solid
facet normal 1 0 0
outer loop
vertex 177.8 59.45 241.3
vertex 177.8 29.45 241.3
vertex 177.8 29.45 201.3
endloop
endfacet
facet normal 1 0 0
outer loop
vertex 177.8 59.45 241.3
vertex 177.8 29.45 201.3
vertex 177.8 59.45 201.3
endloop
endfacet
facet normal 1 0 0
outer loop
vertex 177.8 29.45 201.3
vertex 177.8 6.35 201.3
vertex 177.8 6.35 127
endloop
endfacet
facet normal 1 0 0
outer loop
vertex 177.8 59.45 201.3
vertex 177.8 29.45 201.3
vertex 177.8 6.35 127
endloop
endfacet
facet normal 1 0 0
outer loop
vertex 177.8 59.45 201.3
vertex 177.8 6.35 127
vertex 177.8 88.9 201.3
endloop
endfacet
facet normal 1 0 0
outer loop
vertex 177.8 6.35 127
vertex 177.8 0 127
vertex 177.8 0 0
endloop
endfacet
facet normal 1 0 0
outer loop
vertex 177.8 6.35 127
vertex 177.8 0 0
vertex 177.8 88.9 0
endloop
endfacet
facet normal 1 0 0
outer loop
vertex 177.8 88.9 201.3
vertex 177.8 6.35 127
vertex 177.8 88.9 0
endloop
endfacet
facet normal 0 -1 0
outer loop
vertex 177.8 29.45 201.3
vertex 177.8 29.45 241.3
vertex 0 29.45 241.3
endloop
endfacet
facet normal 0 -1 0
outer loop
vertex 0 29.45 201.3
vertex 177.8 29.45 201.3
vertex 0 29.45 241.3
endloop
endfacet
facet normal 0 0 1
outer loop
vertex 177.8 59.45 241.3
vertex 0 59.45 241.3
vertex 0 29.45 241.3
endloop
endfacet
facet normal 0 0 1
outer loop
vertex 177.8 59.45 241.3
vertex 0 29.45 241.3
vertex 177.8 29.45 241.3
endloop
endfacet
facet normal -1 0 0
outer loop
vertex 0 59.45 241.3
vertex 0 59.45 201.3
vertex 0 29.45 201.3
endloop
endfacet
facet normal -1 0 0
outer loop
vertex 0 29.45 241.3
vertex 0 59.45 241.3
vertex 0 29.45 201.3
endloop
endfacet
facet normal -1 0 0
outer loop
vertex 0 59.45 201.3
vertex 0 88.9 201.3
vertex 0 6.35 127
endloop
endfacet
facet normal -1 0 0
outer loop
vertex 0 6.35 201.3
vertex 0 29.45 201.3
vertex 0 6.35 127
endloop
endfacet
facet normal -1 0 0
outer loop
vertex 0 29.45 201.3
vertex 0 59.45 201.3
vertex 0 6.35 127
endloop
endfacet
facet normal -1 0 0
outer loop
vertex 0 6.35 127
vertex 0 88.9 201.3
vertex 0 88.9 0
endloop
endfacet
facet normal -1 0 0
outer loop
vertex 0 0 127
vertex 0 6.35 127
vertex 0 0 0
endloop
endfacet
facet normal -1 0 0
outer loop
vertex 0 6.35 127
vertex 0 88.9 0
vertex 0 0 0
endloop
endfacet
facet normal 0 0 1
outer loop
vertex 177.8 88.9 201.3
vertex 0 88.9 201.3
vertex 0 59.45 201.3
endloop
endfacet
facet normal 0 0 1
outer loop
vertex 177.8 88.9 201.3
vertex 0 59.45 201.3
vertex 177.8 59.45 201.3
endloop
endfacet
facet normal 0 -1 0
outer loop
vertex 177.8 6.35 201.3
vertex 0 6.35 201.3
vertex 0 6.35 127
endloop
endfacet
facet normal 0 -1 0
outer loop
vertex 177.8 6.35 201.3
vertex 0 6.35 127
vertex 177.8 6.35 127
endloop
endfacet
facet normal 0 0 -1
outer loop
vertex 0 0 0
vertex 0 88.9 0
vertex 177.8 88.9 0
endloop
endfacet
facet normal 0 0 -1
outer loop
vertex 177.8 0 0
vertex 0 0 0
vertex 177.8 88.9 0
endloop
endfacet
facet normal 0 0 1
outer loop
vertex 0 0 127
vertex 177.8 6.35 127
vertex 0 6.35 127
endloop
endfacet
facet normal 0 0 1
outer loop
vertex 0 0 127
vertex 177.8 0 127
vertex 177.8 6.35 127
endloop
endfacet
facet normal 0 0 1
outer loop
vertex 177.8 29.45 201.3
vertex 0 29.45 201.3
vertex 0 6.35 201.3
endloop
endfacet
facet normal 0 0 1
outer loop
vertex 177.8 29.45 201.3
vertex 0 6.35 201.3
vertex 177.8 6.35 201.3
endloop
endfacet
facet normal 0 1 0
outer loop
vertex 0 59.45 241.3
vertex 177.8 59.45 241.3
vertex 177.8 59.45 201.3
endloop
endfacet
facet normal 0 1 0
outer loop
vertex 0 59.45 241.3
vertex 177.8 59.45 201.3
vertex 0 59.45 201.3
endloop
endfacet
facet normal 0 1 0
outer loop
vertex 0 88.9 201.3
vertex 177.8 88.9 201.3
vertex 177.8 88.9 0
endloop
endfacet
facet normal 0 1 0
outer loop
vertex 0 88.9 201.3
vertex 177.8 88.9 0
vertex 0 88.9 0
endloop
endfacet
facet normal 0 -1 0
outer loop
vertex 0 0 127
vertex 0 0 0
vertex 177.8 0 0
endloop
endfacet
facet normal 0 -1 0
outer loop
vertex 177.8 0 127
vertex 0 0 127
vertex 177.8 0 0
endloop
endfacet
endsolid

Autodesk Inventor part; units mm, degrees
ref_plane "YZ Plane" through (0, 0, 0) normal (1, 0, 0) x (0, 1, 0)
ref_plane "XZ Plane" through (0, 0, 0) normal (0, 1, 0) x (-1, 0, 0)
ref_plane "XY Plane" through (0, 0, 0) normal (0, 0, 1) x (1, 0, 0)
sketch "Sketch1" plane through (0, 0, 0) normal (0, 0, 1) x (1, 0, 0)
  line L0 (0, 0) -> (177.8, 0)
  line L1 (177.8, 0) -> (177.8, 88.9)
  line L2 (177.8, 88.9) -> (0, 88.9)
  line L3 (0, 88.9) -> (0, 0)
  dimension "d0" = 88.9
  dimension "d1" = 177.8
extrude "Extrusion1" add sketch "Sketch1" along normal blind 241.3
sketch "Sketch2" plane through (0, 0, 0) normal (0, -1, 0) x (1, 0, 0)
  line L0 (0, 0) -> (0, 241.3) projected
  line L1 (177.8, 0) -> (177.8, 241.3) projected
  line L2 (0, 203.2) -> (177.8, 203.2)
  line L3 (177.8, 203.2) -> (177.8, 127)
  line L4 (177.8, 127) -> (0, 127)
  line L5 (0, 127) -> (0, 203.2)
  line L6 (0, 0) -> (177.8, 0) projected
  dimension "d4" = 203.2
  dimension "d5" = 127
extrude "Extrusion2" cut sketch "Sketch2" against normal blind 6.35 contours L0 L2 L1 L4
sketch "Sketch3" plane through (0, 0, 241.3) normal (0, 0, 1) x (1, 0, 0)
  line L0 (177.8, 0) -> (177.8, 88.9) projected
  line L1 (0, 0) -> (177.8, 0)
  line L2 (177.8, 0) -> (177.8, 29.45)
  line L3 (177.8, 29.45) -> (0, 29.45)
  line L4 (0, 29.45) -> (0, 0)
  line L5 (0, 88.9) -> (0, 0) projected
  line L6 (0, 88.9) -> (177.8, 88.9)
  line L7 (177.8, 88.9) -> (177.8, 59.45)
  line L8 (177.8, 59.45) -> (0, 59.45)
  line L9 (0, 59.45) -> (0, 88.9)
  line L10 (88.9, 29.45) -> (88.9, 59.45) construction
  point P0 (0, 44.45)
  point P1 (88.9, 44.45)
  dimension "d8" = 30
extrude "Extrusion3" cut sketch "Sketch3" against normal blind 40 contours L1 L4 L3 L0 | L8 L5 L6 L0
properties part number "Battery_278Wh" material "ABS Plastic"
